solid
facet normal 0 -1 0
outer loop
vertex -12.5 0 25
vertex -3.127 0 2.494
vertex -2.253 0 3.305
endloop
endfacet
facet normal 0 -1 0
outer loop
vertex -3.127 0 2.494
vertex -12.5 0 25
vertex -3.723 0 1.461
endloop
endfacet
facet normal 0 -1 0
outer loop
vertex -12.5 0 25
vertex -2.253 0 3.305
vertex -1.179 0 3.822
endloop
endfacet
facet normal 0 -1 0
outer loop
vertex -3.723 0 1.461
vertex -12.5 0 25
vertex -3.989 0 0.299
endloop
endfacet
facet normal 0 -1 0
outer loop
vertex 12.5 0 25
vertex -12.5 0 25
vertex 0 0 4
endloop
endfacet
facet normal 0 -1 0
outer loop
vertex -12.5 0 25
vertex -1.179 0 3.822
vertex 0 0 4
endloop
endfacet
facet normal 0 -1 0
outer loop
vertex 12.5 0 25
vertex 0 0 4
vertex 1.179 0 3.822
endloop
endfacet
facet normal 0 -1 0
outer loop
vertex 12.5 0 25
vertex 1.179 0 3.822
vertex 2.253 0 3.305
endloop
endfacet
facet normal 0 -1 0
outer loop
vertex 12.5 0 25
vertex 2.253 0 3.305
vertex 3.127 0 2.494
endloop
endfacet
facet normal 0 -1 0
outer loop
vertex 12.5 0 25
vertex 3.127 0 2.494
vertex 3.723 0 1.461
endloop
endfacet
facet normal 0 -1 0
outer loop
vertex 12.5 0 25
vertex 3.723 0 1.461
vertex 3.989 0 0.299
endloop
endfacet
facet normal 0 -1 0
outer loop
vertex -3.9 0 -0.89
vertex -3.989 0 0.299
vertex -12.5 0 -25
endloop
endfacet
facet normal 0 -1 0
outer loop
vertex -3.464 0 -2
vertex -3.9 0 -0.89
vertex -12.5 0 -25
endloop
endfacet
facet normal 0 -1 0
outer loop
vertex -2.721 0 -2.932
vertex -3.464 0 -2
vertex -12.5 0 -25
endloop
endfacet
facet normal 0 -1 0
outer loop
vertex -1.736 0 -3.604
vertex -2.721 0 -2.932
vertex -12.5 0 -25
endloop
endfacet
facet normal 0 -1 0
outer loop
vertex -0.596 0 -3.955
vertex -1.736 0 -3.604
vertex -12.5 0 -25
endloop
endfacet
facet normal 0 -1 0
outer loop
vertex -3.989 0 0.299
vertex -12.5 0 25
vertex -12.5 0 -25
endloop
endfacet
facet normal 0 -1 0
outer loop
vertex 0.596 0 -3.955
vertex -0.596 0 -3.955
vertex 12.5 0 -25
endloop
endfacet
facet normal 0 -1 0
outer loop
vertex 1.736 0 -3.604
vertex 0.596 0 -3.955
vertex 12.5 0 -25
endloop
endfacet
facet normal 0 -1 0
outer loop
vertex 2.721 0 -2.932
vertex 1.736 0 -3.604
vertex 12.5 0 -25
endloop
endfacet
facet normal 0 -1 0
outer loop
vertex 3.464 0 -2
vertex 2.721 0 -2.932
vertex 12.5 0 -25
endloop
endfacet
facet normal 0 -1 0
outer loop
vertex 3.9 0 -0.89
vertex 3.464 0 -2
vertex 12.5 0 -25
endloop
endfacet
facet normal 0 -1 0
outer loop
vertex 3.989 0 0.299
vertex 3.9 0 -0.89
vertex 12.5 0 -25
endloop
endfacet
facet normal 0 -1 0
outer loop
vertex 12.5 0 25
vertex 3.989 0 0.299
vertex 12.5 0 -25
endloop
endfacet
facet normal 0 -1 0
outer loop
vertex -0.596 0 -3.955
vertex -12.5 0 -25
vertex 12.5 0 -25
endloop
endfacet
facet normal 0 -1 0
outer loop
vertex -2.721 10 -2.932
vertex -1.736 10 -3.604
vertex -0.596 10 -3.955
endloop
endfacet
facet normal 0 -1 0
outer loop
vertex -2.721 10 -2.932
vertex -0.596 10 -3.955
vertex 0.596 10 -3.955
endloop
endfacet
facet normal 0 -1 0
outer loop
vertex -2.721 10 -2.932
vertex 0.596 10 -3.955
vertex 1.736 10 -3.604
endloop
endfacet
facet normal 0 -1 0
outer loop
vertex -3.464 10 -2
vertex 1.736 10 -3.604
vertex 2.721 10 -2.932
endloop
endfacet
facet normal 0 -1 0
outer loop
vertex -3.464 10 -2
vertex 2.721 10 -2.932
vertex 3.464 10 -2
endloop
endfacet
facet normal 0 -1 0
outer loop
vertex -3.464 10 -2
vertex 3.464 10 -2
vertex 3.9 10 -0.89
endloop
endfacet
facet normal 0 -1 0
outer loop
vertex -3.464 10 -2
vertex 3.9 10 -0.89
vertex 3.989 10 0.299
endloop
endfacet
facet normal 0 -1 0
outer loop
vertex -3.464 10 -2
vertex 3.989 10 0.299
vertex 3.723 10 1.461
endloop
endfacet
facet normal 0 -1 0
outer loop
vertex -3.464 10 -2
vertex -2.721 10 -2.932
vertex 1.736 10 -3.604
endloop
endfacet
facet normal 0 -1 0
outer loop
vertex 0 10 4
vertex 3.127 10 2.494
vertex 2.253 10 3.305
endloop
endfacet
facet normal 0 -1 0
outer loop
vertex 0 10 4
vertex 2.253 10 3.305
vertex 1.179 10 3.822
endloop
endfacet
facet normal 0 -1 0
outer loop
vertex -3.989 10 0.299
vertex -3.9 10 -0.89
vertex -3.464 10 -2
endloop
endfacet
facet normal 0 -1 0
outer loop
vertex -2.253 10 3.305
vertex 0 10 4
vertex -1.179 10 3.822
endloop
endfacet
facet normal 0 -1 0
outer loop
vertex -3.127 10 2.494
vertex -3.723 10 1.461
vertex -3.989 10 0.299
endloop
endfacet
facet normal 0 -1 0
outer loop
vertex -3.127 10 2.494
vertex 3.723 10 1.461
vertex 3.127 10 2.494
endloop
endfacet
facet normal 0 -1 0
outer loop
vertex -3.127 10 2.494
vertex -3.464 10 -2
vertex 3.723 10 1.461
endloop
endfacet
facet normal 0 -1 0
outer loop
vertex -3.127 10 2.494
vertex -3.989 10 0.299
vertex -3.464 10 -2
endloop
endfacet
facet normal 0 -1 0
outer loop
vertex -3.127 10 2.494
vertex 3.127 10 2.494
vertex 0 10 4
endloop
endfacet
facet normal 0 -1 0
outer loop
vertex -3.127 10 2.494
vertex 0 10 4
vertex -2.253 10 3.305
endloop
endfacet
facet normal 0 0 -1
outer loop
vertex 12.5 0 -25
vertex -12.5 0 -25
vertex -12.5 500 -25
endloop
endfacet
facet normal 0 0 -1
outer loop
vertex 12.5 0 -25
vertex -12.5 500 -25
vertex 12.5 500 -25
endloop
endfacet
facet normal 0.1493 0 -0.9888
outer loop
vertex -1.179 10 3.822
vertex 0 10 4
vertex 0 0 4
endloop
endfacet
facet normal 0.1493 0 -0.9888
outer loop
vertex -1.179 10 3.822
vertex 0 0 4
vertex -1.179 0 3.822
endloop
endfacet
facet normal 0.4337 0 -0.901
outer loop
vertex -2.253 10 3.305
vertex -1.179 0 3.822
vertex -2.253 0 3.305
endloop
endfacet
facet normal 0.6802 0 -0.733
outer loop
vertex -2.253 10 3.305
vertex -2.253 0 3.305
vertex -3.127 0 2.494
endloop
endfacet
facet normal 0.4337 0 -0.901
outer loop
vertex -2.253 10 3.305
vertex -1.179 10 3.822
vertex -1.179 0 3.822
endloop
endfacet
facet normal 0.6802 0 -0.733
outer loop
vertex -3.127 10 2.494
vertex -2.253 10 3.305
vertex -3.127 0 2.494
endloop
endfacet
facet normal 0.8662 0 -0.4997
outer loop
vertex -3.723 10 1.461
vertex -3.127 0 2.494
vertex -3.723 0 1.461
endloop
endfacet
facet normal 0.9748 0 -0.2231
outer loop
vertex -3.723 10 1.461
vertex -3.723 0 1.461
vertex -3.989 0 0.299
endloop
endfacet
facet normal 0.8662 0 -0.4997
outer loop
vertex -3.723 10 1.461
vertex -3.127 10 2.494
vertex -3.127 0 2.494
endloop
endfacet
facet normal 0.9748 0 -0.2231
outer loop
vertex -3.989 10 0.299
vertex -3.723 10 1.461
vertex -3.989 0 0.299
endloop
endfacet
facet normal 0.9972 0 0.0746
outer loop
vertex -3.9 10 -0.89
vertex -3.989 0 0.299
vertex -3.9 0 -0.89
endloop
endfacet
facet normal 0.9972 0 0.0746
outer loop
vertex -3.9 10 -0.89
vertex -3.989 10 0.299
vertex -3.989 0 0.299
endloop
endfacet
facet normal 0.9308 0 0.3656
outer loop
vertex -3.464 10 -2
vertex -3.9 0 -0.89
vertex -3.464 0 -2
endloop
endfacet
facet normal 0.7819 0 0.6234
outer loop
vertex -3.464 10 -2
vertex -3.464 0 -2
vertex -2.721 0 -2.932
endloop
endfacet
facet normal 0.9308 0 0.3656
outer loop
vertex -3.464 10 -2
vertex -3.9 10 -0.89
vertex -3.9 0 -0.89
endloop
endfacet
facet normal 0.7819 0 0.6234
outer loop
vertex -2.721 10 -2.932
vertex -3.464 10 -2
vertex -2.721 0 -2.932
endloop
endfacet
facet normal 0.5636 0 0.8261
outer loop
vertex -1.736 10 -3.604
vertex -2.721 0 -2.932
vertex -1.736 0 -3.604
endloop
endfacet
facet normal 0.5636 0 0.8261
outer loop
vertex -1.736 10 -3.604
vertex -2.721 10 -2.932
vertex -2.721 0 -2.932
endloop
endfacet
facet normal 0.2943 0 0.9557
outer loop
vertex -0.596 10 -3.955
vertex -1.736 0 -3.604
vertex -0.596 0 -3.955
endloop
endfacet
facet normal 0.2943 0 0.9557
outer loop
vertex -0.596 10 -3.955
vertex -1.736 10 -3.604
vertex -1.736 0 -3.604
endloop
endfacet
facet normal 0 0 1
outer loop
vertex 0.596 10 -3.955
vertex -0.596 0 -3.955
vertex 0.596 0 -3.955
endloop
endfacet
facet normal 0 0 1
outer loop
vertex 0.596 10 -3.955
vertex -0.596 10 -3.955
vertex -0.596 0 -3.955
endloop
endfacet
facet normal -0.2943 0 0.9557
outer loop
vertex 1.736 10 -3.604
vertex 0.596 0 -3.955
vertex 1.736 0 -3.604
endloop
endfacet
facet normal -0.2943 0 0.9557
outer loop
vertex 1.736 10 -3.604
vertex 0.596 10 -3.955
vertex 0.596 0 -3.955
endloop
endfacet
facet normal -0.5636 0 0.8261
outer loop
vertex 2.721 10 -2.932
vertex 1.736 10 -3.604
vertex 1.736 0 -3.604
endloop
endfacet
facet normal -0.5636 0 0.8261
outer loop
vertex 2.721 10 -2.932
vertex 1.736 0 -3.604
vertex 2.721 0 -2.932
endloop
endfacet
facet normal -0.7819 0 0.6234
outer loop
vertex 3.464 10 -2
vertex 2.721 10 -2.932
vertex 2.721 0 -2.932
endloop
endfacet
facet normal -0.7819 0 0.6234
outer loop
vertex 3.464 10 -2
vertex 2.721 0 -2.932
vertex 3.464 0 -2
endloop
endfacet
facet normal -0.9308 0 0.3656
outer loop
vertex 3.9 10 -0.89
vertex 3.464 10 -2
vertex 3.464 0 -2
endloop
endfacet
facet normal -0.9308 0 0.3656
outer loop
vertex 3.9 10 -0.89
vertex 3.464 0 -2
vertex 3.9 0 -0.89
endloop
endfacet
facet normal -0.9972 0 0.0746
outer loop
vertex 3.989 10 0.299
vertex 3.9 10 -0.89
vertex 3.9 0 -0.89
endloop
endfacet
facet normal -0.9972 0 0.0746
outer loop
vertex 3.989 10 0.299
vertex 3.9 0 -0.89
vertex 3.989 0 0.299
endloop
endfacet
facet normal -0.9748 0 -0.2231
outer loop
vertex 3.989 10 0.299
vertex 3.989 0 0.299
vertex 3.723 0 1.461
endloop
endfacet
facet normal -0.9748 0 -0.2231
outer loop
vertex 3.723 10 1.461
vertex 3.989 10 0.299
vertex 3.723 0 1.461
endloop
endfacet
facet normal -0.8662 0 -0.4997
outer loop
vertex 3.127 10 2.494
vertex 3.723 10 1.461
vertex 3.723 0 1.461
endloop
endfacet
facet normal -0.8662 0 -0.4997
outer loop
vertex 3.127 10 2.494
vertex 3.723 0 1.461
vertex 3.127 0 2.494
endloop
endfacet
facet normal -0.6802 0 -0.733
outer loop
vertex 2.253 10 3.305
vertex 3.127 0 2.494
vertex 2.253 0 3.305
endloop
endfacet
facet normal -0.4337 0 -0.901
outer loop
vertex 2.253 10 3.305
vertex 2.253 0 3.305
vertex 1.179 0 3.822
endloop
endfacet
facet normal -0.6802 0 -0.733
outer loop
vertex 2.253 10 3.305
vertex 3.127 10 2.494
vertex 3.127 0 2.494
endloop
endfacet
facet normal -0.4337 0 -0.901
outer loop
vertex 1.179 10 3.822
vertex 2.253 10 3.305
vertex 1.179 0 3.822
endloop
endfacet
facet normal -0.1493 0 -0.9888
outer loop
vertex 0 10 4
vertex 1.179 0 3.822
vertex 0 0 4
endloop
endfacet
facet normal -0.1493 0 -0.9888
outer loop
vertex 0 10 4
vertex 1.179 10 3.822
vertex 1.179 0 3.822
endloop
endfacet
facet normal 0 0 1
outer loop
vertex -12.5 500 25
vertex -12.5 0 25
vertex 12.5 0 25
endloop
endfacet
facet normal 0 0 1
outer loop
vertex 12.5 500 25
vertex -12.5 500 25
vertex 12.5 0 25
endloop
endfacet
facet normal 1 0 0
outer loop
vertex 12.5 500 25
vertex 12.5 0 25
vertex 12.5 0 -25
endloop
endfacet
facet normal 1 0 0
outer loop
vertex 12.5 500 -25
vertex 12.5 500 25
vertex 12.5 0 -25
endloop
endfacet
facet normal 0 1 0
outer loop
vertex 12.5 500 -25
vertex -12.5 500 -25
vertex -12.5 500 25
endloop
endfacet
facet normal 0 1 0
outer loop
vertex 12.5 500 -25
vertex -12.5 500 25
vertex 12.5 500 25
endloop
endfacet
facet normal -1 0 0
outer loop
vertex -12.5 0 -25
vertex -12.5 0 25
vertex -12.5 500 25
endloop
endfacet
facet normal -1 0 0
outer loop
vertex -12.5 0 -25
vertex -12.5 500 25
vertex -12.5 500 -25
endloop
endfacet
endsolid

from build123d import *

# Parameters (mm, degrees)
SKETCH_1_W          = 25
SKETCH_1_H          = 50
EXTRUDE_1_DEPTH     = 550
SKETCH_2_R          = 4
CUT_EXTRUDE_1_DEPTH = 10
CUT_EXTRUDE_START   = -10
SKETCH_3_R          = 4
CUT_EXTRUDE_2_DEPTH = 10
SKETCH_4_W          = 25
SKETCH_4_H          = 50
CUT_EXTRUDE_3_DEPTH = 50


with BuildPart() as part:
    # Эскиз1 → Бобышка-Вытянуть1 (new body)
    with BuildSketch(Plane(origin=(0, 0, 0), x_dir=(1, 0, 0), z_dir=(0, 1, 0))):
        Rectangle(SKETCH_1_W, SKETCH_1_H)
    extrude(amount=EXTRUDE_1_DEPTH)

    # Эскиз2 → Вырез-Вытянуть1 (cut)
    with BuildSketch(Plane(origin=(0, 550, 0), x_dir=(1, 0, 0), z_dir=(0, 1, 0))):
        with Locations(Location((0, 0, 0), (0, 0, 270))):
            Circle(SKETCH_2_R)
    extrude(amount=-CUT_EXTRUDE_1_DEPTH, mode=Mode.SUBTRACT)

    # Эскиз3 → Вырез-Вытянуть2 (cut)
    with BuildSketch(Plane.XZ.offset(CUT_EXTRUDE_START)):
        with Locations(Location((0, 0, 0), (0, 0, 90))):
            Circle(SKETCH_3_R)
    extrude(amount=CUT_EXTRUDE_2_DEPTH, mode=Mode.SUBTRACT)

    # Эскиз4 → Вырез-Вытянуть3 (cut)
    with BuildSketch(Plane(origin=(0, 550, 0), x_dir=(1, 0, 0), z_dir=(0, 1, 0))):
        Rectangle(SKETCH_4_W, SKETCH_4_H)
    extrude(amount=-CUT_EXTRUDE_3_DEPTH, mode=Mode.SUBTRACT)


solid = part.part
